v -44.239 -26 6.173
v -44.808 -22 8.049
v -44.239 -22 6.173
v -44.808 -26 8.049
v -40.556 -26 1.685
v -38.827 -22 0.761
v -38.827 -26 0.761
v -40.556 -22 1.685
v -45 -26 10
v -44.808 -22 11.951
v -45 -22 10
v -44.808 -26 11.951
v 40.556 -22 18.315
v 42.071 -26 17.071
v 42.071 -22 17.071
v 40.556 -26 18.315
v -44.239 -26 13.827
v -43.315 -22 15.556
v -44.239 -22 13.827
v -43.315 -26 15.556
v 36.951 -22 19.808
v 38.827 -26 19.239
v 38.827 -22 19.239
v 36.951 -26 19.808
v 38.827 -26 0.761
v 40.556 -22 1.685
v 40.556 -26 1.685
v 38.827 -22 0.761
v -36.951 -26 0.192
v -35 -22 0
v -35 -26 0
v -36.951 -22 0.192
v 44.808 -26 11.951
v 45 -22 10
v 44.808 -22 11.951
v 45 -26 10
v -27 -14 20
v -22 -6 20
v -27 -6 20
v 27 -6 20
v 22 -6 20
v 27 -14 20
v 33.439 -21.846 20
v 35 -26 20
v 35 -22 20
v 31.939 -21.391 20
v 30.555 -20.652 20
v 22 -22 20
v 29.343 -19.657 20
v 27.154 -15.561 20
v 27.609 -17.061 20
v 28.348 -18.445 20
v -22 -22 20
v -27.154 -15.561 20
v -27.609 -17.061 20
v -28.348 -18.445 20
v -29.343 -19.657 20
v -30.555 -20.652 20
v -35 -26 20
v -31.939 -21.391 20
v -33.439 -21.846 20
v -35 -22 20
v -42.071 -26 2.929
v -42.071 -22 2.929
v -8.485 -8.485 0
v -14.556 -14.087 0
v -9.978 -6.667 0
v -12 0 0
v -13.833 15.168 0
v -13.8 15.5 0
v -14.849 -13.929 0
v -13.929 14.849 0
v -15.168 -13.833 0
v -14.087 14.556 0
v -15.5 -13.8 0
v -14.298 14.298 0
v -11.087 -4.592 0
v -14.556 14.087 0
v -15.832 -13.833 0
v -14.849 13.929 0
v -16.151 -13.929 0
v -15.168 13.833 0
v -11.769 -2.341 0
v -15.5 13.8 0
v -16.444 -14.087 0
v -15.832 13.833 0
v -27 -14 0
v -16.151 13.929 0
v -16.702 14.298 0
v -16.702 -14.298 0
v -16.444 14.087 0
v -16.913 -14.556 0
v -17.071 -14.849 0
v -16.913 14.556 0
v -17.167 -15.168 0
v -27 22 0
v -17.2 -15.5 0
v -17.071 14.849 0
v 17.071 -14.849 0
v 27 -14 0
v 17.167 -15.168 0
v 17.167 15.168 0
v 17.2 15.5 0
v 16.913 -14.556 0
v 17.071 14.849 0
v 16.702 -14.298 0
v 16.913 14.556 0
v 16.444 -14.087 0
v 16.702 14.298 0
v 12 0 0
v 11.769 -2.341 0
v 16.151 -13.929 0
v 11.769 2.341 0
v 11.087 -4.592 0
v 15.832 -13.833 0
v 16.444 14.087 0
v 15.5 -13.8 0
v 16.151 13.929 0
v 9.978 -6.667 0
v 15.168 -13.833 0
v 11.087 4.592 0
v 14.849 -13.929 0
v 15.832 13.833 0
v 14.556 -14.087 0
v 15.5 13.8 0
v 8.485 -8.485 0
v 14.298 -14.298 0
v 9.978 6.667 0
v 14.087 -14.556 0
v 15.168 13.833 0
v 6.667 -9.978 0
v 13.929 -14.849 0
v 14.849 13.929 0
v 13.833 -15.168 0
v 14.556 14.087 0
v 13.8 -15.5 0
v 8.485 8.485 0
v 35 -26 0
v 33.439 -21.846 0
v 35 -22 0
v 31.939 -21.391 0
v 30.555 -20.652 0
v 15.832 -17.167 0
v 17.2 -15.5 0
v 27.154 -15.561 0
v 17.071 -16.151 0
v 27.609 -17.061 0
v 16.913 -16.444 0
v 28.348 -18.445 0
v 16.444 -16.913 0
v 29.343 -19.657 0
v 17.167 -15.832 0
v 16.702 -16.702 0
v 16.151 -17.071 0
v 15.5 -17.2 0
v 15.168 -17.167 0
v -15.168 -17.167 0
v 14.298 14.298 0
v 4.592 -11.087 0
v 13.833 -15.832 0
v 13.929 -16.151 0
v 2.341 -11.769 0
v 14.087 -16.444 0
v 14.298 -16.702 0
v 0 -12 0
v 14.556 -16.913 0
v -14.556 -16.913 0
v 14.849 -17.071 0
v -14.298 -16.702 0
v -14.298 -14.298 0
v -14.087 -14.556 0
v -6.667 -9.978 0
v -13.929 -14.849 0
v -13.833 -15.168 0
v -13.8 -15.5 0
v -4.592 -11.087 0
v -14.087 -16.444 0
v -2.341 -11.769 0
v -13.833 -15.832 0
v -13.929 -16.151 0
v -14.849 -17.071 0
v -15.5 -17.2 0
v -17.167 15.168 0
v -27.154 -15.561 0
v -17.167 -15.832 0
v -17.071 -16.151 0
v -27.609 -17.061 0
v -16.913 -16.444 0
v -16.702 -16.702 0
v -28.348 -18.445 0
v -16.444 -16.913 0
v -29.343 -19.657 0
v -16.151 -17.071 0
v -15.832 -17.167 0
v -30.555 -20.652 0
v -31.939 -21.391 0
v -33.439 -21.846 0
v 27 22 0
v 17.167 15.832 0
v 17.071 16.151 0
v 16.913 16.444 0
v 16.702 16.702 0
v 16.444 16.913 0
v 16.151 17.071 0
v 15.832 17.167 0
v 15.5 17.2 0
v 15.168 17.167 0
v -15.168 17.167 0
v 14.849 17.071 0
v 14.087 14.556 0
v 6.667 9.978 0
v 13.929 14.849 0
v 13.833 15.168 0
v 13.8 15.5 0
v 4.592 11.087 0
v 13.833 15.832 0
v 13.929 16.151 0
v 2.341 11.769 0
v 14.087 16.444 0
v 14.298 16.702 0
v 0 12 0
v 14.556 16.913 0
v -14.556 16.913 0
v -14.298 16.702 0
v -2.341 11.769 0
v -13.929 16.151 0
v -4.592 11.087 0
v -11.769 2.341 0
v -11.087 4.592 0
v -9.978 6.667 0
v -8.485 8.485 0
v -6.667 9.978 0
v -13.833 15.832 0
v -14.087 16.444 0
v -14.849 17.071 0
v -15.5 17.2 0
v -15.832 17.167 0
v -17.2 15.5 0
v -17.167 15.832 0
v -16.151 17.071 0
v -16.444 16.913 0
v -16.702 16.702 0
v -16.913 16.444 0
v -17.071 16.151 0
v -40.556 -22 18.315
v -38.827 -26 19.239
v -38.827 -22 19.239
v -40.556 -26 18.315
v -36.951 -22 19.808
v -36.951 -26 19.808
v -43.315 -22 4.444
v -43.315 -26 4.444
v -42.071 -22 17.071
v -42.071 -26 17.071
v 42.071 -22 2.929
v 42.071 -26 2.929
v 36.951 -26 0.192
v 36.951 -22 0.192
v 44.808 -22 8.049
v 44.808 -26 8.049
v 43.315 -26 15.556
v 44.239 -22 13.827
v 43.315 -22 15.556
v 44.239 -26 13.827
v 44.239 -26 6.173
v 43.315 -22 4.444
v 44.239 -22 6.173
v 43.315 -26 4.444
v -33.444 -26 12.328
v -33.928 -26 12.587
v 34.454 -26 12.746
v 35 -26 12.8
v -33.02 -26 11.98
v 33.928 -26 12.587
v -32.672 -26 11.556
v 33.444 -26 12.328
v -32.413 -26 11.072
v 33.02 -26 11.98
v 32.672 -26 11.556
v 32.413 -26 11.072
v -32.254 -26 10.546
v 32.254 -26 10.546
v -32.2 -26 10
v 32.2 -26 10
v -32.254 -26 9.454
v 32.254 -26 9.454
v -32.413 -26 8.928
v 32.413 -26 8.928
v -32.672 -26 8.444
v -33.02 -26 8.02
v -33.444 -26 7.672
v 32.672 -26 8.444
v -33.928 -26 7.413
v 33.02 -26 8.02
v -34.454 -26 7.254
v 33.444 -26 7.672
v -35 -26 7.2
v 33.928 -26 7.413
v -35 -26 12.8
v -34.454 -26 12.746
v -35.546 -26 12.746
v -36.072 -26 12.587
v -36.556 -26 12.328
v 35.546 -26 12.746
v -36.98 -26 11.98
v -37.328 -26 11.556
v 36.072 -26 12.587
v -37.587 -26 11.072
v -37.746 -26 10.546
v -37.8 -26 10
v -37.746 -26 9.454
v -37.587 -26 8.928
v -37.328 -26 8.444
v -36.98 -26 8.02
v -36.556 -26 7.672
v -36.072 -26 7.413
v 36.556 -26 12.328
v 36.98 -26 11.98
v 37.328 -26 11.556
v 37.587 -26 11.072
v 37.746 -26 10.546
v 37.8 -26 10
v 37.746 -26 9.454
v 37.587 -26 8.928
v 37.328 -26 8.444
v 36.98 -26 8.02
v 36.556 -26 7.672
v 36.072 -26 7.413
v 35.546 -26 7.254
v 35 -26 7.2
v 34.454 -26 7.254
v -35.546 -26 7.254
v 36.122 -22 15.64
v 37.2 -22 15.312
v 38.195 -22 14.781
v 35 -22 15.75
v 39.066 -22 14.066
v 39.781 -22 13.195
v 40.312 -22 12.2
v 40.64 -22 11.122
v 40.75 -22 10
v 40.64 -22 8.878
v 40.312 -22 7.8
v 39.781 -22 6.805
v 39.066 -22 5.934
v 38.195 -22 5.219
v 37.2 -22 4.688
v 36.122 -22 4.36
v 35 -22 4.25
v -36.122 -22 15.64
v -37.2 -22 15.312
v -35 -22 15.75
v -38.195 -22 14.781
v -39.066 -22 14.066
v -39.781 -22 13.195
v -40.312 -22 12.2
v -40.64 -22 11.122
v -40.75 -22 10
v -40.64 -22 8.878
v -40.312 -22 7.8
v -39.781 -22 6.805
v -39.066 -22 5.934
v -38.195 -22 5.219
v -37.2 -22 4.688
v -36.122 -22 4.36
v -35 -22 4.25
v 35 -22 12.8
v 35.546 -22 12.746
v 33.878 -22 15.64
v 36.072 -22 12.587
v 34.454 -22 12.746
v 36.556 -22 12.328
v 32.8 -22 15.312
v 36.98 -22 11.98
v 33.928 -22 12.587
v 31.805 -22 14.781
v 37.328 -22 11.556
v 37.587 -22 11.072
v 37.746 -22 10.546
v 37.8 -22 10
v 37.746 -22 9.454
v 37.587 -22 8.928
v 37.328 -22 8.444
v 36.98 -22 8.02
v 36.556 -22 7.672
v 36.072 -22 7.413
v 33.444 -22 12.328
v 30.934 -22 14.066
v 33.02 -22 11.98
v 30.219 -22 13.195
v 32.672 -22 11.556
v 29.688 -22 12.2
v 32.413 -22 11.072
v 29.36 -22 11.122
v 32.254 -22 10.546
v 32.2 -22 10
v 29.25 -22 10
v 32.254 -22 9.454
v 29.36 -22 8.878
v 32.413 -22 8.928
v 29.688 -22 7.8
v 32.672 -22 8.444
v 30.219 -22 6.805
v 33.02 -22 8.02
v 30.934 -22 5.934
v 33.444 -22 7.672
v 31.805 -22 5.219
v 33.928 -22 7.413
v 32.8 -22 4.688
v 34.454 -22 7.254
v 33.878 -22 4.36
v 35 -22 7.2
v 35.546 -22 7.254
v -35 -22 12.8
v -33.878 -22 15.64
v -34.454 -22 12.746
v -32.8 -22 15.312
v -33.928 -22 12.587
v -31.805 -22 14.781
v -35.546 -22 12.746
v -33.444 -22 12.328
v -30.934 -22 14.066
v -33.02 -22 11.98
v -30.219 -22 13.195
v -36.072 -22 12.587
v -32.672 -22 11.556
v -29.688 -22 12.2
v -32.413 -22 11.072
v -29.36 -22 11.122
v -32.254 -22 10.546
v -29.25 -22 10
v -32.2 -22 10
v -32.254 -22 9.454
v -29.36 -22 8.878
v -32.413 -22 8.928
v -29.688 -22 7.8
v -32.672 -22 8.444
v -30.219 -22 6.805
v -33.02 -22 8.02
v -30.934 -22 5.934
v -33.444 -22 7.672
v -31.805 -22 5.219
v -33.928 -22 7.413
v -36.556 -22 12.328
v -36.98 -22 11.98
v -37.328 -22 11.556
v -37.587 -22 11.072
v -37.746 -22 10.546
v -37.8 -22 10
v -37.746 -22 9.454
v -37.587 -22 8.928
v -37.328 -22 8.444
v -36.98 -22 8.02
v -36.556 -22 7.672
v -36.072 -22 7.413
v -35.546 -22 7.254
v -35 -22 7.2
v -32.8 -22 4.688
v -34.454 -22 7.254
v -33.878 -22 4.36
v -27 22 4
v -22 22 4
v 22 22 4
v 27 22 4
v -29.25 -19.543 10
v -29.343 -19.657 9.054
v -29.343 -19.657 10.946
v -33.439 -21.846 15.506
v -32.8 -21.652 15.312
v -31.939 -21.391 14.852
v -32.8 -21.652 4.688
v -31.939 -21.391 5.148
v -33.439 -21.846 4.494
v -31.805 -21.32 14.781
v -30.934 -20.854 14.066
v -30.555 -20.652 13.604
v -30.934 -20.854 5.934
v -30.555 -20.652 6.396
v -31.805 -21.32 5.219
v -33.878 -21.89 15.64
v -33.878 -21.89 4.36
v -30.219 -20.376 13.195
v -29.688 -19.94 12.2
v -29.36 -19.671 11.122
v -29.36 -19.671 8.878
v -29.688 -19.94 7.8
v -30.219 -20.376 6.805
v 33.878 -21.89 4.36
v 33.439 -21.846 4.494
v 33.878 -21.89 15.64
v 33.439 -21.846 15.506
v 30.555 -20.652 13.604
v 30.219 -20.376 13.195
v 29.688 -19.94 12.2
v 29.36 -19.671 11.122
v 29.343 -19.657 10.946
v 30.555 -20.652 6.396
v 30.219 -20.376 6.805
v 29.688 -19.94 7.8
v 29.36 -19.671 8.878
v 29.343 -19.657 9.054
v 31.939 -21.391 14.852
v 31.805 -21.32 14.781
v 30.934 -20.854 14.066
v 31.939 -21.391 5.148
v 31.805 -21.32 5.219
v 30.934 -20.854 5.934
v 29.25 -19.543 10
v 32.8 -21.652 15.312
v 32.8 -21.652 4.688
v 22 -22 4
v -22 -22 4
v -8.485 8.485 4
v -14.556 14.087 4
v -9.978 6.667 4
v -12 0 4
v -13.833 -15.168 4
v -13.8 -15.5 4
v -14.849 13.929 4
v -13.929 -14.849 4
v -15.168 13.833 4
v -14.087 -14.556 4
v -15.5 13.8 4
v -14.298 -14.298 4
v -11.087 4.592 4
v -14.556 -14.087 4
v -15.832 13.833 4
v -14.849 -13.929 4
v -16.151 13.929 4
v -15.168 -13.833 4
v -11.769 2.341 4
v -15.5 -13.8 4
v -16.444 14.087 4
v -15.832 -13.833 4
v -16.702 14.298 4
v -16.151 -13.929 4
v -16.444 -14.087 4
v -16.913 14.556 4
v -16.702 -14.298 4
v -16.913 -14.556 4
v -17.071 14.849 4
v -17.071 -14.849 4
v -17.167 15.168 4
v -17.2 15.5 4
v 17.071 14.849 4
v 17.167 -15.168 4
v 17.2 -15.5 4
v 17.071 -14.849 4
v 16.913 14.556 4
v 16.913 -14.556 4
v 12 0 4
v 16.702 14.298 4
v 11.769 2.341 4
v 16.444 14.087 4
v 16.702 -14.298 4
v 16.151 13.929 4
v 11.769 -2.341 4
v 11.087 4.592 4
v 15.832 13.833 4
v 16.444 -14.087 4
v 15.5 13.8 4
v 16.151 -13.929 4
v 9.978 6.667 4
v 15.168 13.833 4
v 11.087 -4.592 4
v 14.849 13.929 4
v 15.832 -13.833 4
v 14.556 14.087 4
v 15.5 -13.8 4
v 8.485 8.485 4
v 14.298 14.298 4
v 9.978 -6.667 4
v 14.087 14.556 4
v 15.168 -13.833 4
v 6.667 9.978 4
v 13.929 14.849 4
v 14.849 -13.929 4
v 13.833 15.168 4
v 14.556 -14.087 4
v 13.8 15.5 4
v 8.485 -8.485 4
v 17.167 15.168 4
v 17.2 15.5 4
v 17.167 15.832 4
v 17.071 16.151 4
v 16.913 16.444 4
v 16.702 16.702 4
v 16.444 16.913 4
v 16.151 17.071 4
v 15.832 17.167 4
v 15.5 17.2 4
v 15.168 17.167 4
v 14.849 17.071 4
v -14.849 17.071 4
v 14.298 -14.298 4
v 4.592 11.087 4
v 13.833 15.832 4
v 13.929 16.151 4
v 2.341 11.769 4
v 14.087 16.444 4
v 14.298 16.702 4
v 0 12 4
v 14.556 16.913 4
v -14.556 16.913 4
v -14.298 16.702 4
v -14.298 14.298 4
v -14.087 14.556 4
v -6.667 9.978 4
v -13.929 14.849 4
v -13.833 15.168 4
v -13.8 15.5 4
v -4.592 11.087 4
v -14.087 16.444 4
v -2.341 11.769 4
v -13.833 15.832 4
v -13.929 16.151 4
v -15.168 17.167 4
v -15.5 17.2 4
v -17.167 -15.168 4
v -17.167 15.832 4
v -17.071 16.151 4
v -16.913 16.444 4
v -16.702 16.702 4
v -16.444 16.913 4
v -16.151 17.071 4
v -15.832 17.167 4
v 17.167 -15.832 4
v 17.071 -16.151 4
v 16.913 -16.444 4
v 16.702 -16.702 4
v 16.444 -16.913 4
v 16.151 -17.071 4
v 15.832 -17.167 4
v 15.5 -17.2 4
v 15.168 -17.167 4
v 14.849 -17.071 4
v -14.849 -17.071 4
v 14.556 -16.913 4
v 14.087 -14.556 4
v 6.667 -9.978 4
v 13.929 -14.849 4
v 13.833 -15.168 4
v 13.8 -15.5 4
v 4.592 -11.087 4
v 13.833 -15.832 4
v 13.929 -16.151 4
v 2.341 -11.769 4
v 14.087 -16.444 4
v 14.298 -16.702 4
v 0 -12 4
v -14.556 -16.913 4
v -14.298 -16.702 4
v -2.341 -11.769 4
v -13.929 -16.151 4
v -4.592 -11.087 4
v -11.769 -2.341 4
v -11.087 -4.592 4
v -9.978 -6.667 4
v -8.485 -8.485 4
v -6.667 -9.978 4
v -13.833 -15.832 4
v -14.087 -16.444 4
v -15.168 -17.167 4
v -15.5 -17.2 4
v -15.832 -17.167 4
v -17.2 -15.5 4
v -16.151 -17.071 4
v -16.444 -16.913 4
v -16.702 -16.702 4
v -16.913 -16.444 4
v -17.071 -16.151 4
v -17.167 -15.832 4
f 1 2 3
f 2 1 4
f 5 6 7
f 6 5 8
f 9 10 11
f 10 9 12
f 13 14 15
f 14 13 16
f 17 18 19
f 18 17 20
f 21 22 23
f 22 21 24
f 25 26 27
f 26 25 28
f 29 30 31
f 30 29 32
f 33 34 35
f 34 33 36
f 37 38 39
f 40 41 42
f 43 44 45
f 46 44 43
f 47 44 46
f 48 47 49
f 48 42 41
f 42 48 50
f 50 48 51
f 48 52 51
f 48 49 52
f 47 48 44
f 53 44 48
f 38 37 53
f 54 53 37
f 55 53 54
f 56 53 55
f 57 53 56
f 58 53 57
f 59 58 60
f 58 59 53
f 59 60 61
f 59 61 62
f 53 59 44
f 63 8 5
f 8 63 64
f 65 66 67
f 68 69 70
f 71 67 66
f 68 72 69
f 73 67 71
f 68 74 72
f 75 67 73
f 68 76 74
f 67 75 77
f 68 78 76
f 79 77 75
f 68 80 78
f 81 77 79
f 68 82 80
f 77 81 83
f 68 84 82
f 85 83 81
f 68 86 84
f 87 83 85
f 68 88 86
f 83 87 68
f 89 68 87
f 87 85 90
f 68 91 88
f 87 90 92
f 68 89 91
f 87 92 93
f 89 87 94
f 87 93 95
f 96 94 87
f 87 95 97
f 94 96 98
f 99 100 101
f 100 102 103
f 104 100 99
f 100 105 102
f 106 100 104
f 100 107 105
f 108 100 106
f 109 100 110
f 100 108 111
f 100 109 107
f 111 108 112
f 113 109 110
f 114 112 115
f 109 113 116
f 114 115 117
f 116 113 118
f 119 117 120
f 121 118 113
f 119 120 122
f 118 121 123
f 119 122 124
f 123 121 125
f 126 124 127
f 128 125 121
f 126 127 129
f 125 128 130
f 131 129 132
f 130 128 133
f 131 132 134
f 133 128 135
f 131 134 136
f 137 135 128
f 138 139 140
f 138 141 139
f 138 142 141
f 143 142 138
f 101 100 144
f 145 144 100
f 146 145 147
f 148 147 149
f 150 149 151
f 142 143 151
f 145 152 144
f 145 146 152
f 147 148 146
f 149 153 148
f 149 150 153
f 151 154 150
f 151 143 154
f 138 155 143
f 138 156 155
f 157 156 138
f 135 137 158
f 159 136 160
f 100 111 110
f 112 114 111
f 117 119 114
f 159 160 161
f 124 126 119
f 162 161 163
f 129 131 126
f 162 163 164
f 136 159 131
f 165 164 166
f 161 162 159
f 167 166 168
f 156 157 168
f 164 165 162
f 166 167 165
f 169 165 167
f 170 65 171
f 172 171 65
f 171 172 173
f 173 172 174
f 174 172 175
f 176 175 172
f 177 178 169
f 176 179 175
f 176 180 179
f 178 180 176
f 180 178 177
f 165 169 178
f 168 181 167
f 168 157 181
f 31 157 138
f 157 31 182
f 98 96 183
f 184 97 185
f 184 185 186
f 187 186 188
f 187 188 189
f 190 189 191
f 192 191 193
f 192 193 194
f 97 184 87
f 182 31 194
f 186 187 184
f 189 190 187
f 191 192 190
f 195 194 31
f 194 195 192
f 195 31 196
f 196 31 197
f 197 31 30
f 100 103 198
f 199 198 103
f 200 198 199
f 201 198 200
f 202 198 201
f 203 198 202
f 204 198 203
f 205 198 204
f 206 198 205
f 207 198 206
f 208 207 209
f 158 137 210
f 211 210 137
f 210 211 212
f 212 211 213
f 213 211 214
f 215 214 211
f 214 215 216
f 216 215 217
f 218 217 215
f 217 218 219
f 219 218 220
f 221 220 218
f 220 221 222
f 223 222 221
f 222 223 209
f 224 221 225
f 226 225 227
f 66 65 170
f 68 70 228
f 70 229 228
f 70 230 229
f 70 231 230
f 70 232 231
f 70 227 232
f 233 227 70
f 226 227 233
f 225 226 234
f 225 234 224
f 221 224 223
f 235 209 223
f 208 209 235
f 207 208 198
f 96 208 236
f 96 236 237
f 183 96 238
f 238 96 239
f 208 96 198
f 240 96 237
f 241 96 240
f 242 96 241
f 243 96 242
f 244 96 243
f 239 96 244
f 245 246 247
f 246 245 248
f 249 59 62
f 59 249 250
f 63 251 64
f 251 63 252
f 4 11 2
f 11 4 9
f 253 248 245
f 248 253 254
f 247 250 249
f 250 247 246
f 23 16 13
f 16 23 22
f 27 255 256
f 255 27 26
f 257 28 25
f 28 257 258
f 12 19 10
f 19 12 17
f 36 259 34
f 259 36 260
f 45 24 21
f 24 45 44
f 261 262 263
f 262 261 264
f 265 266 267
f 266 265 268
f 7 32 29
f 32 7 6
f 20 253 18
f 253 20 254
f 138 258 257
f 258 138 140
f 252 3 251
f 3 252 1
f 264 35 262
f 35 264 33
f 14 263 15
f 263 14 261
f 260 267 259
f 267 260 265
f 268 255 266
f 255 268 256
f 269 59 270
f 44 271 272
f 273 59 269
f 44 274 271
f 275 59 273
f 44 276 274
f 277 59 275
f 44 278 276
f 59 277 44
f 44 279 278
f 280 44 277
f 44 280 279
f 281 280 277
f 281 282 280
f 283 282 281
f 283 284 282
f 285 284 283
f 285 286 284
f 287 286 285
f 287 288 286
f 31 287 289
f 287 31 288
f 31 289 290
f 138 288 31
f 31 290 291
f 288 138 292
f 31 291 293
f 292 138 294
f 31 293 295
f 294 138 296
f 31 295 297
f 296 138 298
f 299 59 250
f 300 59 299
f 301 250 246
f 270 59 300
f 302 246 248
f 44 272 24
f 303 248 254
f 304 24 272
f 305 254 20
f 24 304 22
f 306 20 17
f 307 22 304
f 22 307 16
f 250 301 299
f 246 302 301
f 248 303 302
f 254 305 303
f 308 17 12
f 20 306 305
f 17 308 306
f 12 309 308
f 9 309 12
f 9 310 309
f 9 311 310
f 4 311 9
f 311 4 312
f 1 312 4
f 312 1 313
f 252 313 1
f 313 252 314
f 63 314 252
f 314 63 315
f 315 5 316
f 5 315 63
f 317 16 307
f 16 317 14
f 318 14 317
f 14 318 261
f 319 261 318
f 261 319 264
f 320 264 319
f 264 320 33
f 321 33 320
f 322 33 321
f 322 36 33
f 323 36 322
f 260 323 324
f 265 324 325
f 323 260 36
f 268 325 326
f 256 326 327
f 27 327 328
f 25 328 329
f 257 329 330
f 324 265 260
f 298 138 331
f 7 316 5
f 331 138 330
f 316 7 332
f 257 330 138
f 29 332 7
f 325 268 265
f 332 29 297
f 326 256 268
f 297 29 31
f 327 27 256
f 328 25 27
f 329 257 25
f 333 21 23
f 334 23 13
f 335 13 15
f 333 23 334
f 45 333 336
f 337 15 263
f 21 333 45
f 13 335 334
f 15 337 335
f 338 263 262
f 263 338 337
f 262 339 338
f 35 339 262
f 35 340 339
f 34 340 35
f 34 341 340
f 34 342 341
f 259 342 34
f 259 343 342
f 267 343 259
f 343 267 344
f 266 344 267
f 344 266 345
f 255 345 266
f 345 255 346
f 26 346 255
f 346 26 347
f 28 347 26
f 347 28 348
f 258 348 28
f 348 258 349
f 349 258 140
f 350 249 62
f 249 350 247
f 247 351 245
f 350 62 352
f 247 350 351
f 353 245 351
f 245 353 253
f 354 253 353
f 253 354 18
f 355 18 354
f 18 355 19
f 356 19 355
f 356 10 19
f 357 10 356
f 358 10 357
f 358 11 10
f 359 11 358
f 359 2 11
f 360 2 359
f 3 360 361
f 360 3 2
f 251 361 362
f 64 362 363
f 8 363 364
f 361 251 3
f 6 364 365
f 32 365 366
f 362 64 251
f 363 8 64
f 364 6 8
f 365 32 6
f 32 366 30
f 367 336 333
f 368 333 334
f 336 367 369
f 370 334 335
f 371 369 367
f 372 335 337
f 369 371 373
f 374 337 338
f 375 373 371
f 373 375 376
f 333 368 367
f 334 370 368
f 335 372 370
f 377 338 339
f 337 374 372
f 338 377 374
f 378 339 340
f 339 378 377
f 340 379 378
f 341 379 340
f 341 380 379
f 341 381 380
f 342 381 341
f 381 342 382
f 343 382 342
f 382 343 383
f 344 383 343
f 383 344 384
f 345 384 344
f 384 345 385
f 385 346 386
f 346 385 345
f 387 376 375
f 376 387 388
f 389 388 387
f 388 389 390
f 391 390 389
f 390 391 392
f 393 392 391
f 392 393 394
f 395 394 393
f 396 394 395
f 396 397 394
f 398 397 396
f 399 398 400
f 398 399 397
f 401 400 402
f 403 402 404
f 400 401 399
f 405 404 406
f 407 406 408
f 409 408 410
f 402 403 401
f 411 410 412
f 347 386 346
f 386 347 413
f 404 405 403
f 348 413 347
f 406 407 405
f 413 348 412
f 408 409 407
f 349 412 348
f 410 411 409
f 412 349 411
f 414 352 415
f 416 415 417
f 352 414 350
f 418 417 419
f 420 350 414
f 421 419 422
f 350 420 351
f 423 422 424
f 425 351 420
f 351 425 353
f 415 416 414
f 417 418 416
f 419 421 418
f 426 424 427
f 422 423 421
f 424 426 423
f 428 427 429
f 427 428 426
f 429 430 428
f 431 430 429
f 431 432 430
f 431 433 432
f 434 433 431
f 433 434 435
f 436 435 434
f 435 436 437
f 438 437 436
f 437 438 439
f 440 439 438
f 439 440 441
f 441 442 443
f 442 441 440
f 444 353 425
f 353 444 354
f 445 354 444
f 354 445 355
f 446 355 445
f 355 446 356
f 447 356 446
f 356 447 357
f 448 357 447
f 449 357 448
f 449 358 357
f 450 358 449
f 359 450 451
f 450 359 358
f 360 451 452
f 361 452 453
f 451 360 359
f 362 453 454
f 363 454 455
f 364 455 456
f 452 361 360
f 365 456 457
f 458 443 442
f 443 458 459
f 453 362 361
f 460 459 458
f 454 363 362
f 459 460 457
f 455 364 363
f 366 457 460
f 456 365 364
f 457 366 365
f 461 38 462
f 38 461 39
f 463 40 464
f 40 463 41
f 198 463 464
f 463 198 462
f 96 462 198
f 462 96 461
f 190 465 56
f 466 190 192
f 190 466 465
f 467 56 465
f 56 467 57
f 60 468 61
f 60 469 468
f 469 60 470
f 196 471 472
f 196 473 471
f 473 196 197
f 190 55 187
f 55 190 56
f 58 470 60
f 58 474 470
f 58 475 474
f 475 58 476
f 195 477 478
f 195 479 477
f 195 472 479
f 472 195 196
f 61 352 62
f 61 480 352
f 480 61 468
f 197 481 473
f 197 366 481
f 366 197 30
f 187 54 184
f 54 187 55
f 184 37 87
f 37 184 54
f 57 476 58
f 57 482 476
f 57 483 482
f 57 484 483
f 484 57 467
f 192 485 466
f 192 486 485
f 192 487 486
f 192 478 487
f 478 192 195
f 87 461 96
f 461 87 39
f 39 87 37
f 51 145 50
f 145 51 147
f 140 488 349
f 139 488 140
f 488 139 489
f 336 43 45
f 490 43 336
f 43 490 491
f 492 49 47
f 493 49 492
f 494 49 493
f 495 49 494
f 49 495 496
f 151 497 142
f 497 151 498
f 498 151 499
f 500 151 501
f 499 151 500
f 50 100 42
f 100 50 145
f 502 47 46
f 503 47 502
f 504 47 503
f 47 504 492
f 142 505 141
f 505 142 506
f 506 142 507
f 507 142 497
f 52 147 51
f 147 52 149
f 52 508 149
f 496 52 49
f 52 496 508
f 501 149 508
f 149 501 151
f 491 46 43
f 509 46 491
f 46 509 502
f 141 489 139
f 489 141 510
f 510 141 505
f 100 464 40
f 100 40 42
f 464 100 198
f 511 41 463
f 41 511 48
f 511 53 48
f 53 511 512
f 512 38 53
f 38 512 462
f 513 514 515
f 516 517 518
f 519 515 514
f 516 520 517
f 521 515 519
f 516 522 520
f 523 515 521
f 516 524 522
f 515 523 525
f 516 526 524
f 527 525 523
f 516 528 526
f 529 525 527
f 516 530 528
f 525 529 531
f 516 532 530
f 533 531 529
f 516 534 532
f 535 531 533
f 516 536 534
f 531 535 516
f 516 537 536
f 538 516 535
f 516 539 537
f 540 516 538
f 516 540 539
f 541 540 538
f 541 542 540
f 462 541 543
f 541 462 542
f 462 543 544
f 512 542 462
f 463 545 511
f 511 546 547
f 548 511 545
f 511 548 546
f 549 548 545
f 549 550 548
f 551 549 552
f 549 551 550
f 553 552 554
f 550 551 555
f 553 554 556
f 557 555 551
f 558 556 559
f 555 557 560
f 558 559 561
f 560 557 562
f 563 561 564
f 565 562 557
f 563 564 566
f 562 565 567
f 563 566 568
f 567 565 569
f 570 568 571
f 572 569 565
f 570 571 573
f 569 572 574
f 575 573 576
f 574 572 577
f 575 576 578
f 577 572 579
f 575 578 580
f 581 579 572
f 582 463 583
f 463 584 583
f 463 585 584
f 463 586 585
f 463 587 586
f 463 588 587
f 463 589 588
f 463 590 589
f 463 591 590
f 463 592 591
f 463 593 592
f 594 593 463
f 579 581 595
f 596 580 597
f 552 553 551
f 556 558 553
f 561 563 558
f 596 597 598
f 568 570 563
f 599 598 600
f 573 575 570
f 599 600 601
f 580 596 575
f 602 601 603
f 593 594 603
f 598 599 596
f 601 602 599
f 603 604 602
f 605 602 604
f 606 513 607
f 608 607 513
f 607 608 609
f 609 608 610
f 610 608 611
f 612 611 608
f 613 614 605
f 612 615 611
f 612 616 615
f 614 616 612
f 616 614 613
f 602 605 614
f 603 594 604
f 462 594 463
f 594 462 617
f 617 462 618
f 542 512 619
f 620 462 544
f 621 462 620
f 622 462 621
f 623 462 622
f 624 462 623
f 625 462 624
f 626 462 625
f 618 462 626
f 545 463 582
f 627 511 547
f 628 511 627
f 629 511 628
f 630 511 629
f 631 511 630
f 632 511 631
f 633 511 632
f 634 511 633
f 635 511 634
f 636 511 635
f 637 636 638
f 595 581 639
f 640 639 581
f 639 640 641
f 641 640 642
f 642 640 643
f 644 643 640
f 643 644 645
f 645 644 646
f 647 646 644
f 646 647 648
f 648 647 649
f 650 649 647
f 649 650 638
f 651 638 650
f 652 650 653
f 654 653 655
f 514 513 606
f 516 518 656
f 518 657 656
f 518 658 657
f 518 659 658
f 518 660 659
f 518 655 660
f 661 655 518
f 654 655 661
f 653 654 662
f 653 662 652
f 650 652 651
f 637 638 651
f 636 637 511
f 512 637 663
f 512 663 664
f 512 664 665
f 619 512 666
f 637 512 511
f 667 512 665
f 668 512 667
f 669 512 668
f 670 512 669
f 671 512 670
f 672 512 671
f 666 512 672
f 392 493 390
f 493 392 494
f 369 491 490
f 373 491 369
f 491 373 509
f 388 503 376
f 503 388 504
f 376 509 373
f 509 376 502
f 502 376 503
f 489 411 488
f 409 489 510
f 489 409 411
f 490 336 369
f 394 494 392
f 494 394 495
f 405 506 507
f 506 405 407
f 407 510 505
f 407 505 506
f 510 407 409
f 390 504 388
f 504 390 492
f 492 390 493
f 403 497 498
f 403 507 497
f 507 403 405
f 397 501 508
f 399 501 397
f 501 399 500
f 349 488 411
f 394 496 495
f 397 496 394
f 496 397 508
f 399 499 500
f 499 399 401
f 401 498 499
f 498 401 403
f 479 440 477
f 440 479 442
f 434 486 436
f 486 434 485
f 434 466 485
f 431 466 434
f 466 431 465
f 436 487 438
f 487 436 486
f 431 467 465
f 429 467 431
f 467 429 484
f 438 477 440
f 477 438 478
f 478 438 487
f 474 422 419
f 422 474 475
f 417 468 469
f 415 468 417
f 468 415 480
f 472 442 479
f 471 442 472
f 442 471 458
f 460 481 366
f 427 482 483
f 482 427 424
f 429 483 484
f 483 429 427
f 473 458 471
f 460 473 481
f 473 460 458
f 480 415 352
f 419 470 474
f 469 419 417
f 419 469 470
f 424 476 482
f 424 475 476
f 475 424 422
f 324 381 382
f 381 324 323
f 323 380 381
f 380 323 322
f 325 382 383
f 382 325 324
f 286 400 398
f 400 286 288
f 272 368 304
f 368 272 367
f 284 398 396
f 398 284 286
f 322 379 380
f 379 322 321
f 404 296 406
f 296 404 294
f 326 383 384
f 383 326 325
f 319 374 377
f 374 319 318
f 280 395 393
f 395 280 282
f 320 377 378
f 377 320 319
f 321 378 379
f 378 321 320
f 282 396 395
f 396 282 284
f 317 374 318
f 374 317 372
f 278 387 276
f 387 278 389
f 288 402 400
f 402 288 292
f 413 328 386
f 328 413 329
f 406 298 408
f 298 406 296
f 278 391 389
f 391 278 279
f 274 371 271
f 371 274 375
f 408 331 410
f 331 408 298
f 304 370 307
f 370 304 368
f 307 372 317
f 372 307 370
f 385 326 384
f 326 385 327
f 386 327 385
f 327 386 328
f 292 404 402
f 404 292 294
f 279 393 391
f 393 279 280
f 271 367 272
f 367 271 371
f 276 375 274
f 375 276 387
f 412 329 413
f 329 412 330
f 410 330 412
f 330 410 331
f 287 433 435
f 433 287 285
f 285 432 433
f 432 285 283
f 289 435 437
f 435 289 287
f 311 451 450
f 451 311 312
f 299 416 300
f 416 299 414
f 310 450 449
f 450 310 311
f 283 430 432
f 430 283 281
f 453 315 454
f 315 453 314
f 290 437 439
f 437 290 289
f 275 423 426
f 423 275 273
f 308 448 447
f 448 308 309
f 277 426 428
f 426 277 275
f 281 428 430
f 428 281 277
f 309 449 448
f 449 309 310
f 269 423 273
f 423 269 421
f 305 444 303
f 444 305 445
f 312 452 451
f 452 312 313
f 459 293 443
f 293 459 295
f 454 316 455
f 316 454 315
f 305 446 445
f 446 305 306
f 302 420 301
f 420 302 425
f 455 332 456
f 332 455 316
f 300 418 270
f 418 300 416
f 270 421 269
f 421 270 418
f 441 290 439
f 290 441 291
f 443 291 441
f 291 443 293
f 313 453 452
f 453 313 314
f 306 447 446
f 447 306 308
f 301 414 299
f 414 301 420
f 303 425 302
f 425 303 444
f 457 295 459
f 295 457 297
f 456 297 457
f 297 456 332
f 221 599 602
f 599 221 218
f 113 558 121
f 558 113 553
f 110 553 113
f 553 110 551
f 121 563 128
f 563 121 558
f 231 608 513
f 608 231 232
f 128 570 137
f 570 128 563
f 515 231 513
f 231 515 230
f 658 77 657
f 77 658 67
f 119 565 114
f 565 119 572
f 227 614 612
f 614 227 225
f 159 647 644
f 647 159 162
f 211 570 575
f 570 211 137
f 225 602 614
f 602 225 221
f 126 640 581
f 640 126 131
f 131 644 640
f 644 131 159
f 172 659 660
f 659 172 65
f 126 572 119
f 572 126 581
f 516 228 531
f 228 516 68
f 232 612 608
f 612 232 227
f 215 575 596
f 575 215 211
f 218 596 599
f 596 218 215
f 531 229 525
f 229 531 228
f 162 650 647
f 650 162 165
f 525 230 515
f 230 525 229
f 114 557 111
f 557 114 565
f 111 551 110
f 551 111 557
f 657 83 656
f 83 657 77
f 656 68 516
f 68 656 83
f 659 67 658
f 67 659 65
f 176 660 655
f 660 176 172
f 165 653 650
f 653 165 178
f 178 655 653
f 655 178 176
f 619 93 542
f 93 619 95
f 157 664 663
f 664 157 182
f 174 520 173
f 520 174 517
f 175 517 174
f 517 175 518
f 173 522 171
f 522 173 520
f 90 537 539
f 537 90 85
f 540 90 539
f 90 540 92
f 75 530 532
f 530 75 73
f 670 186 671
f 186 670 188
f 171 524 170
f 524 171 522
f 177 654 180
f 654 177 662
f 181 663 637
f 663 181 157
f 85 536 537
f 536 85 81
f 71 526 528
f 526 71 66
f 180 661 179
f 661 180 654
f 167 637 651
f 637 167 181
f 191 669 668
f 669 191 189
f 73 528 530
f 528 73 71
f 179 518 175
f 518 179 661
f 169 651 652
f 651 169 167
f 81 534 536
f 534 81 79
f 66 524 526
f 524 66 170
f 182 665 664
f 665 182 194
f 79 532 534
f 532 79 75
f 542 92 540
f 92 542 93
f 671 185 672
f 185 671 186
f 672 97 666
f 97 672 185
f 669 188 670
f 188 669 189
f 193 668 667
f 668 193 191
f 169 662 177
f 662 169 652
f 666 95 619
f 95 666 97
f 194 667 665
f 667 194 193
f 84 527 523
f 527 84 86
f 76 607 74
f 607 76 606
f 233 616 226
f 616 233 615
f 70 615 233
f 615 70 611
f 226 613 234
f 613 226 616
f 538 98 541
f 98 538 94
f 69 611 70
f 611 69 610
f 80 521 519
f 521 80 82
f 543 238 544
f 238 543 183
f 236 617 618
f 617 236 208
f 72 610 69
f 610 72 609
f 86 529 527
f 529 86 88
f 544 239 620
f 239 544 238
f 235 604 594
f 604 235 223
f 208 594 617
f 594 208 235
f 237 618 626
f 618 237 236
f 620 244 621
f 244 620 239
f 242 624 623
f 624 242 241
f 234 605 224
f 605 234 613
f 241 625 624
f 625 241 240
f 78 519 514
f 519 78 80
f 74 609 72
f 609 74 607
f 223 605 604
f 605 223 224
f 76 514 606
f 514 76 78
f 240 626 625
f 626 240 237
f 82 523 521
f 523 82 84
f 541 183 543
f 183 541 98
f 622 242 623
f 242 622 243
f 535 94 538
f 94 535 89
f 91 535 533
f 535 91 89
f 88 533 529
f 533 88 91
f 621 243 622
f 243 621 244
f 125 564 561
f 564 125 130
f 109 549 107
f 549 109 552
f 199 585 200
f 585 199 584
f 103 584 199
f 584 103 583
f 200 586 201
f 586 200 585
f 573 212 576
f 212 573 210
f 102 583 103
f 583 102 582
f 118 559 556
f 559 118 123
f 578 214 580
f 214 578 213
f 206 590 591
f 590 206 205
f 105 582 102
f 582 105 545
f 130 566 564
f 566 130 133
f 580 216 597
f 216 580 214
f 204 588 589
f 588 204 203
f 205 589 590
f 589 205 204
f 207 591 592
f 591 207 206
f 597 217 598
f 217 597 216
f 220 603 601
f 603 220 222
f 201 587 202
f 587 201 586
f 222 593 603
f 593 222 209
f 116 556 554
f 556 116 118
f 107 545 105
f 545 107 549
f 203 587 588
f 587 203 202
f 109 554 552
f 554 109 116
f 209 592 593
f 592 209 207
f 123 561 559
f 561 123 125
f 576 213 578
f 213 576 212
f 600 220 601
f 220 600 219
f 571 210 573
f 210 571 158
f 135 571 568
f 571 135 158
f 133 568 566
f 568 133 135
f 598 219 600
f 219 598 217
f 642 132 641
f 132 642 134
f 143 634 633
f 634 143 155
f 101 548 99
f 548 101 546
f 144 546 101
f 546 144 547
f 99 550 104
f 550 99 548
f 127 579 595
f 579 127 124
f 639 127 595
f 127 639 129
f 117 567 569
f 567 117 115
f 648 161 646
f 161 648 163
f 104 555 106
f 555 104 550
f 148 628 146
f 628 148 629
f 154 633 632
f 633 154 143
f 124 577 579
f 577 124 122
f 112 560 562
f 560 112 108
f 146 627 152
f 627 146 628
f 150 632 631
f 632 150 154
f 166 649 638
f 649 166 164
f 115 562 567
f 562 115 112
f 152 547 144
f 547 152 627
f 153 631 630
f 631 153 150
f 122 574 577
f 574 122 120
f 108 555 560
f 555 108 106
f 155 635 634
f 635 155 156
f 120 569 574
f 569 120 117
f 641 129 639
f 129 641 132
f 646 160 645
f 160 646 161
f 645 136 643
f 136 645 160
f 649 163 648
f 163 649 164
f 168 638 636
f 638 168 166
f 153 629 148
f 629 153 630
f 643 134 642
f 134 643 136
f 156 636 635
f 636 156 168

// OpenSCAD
$fn=32;

difference() {
    translate([0,-4-44/2,0])
    rotate([-90,0,0])
    translate([0,-10,0])
    difference() {
        union() {
            hull() {
                d=44/2+5+8;
                translate([-d,0,0]) cylinder(d=20,h=4);
                translate([d,0,0]) cylinder(d=20,h=4);
            }
            hull() {
                d=44/2+5+8;
                translate([-d,-10,0]) cube([d+d,20,20]);
                translate([-d,6,0]) cube([d+d,4,4+44]);
            }
        }
        translate([-22,-11,4]) cube([44,17,45]);
        
        translate([-44/2-5-8,0,4+8]) {
            rotate([90,0,0]) cylinder(r=8,h=22, center=true);
            translate([-8,-11,0]) cube([16,22,44]);
        }
        
        translate([44/2+5+8,0,4+8]) {
            rotate([90,0,0]) cylinder(r=8,h=22, center=true);
            translate([-8,-11,0]) cube([16,22,44]);
        }
        
        translate([44/2+5+8,0,4]) cylinder(d=11.5,h=10);
        translate([-44/2-5-8,0,4]) cylinder(d=11.5,h=10);
        translate([44/2+5+8,0,-1]) cylinder(d=5.6,h=10);
        translate([-44/2-5-8,0,-1]) cylinder(d=5.6,h=10);
    }
    
    // motor cutout
    union() {
        translate([0,0,-1]) cylinder(d=24,h=17);
        translate([-15.5,-15.5,-1]) cylinder(d=3.4,h=17);
        translate([-15.5,15.5,-1]) cylinder(d=3.4,h=17);
        translate([15.5,15.5,-1]) cylinder(d=3.4,h=17);
        translate([15.5,-15.5,-1]) cylinder(d=3.4,h=17);
    }
}
